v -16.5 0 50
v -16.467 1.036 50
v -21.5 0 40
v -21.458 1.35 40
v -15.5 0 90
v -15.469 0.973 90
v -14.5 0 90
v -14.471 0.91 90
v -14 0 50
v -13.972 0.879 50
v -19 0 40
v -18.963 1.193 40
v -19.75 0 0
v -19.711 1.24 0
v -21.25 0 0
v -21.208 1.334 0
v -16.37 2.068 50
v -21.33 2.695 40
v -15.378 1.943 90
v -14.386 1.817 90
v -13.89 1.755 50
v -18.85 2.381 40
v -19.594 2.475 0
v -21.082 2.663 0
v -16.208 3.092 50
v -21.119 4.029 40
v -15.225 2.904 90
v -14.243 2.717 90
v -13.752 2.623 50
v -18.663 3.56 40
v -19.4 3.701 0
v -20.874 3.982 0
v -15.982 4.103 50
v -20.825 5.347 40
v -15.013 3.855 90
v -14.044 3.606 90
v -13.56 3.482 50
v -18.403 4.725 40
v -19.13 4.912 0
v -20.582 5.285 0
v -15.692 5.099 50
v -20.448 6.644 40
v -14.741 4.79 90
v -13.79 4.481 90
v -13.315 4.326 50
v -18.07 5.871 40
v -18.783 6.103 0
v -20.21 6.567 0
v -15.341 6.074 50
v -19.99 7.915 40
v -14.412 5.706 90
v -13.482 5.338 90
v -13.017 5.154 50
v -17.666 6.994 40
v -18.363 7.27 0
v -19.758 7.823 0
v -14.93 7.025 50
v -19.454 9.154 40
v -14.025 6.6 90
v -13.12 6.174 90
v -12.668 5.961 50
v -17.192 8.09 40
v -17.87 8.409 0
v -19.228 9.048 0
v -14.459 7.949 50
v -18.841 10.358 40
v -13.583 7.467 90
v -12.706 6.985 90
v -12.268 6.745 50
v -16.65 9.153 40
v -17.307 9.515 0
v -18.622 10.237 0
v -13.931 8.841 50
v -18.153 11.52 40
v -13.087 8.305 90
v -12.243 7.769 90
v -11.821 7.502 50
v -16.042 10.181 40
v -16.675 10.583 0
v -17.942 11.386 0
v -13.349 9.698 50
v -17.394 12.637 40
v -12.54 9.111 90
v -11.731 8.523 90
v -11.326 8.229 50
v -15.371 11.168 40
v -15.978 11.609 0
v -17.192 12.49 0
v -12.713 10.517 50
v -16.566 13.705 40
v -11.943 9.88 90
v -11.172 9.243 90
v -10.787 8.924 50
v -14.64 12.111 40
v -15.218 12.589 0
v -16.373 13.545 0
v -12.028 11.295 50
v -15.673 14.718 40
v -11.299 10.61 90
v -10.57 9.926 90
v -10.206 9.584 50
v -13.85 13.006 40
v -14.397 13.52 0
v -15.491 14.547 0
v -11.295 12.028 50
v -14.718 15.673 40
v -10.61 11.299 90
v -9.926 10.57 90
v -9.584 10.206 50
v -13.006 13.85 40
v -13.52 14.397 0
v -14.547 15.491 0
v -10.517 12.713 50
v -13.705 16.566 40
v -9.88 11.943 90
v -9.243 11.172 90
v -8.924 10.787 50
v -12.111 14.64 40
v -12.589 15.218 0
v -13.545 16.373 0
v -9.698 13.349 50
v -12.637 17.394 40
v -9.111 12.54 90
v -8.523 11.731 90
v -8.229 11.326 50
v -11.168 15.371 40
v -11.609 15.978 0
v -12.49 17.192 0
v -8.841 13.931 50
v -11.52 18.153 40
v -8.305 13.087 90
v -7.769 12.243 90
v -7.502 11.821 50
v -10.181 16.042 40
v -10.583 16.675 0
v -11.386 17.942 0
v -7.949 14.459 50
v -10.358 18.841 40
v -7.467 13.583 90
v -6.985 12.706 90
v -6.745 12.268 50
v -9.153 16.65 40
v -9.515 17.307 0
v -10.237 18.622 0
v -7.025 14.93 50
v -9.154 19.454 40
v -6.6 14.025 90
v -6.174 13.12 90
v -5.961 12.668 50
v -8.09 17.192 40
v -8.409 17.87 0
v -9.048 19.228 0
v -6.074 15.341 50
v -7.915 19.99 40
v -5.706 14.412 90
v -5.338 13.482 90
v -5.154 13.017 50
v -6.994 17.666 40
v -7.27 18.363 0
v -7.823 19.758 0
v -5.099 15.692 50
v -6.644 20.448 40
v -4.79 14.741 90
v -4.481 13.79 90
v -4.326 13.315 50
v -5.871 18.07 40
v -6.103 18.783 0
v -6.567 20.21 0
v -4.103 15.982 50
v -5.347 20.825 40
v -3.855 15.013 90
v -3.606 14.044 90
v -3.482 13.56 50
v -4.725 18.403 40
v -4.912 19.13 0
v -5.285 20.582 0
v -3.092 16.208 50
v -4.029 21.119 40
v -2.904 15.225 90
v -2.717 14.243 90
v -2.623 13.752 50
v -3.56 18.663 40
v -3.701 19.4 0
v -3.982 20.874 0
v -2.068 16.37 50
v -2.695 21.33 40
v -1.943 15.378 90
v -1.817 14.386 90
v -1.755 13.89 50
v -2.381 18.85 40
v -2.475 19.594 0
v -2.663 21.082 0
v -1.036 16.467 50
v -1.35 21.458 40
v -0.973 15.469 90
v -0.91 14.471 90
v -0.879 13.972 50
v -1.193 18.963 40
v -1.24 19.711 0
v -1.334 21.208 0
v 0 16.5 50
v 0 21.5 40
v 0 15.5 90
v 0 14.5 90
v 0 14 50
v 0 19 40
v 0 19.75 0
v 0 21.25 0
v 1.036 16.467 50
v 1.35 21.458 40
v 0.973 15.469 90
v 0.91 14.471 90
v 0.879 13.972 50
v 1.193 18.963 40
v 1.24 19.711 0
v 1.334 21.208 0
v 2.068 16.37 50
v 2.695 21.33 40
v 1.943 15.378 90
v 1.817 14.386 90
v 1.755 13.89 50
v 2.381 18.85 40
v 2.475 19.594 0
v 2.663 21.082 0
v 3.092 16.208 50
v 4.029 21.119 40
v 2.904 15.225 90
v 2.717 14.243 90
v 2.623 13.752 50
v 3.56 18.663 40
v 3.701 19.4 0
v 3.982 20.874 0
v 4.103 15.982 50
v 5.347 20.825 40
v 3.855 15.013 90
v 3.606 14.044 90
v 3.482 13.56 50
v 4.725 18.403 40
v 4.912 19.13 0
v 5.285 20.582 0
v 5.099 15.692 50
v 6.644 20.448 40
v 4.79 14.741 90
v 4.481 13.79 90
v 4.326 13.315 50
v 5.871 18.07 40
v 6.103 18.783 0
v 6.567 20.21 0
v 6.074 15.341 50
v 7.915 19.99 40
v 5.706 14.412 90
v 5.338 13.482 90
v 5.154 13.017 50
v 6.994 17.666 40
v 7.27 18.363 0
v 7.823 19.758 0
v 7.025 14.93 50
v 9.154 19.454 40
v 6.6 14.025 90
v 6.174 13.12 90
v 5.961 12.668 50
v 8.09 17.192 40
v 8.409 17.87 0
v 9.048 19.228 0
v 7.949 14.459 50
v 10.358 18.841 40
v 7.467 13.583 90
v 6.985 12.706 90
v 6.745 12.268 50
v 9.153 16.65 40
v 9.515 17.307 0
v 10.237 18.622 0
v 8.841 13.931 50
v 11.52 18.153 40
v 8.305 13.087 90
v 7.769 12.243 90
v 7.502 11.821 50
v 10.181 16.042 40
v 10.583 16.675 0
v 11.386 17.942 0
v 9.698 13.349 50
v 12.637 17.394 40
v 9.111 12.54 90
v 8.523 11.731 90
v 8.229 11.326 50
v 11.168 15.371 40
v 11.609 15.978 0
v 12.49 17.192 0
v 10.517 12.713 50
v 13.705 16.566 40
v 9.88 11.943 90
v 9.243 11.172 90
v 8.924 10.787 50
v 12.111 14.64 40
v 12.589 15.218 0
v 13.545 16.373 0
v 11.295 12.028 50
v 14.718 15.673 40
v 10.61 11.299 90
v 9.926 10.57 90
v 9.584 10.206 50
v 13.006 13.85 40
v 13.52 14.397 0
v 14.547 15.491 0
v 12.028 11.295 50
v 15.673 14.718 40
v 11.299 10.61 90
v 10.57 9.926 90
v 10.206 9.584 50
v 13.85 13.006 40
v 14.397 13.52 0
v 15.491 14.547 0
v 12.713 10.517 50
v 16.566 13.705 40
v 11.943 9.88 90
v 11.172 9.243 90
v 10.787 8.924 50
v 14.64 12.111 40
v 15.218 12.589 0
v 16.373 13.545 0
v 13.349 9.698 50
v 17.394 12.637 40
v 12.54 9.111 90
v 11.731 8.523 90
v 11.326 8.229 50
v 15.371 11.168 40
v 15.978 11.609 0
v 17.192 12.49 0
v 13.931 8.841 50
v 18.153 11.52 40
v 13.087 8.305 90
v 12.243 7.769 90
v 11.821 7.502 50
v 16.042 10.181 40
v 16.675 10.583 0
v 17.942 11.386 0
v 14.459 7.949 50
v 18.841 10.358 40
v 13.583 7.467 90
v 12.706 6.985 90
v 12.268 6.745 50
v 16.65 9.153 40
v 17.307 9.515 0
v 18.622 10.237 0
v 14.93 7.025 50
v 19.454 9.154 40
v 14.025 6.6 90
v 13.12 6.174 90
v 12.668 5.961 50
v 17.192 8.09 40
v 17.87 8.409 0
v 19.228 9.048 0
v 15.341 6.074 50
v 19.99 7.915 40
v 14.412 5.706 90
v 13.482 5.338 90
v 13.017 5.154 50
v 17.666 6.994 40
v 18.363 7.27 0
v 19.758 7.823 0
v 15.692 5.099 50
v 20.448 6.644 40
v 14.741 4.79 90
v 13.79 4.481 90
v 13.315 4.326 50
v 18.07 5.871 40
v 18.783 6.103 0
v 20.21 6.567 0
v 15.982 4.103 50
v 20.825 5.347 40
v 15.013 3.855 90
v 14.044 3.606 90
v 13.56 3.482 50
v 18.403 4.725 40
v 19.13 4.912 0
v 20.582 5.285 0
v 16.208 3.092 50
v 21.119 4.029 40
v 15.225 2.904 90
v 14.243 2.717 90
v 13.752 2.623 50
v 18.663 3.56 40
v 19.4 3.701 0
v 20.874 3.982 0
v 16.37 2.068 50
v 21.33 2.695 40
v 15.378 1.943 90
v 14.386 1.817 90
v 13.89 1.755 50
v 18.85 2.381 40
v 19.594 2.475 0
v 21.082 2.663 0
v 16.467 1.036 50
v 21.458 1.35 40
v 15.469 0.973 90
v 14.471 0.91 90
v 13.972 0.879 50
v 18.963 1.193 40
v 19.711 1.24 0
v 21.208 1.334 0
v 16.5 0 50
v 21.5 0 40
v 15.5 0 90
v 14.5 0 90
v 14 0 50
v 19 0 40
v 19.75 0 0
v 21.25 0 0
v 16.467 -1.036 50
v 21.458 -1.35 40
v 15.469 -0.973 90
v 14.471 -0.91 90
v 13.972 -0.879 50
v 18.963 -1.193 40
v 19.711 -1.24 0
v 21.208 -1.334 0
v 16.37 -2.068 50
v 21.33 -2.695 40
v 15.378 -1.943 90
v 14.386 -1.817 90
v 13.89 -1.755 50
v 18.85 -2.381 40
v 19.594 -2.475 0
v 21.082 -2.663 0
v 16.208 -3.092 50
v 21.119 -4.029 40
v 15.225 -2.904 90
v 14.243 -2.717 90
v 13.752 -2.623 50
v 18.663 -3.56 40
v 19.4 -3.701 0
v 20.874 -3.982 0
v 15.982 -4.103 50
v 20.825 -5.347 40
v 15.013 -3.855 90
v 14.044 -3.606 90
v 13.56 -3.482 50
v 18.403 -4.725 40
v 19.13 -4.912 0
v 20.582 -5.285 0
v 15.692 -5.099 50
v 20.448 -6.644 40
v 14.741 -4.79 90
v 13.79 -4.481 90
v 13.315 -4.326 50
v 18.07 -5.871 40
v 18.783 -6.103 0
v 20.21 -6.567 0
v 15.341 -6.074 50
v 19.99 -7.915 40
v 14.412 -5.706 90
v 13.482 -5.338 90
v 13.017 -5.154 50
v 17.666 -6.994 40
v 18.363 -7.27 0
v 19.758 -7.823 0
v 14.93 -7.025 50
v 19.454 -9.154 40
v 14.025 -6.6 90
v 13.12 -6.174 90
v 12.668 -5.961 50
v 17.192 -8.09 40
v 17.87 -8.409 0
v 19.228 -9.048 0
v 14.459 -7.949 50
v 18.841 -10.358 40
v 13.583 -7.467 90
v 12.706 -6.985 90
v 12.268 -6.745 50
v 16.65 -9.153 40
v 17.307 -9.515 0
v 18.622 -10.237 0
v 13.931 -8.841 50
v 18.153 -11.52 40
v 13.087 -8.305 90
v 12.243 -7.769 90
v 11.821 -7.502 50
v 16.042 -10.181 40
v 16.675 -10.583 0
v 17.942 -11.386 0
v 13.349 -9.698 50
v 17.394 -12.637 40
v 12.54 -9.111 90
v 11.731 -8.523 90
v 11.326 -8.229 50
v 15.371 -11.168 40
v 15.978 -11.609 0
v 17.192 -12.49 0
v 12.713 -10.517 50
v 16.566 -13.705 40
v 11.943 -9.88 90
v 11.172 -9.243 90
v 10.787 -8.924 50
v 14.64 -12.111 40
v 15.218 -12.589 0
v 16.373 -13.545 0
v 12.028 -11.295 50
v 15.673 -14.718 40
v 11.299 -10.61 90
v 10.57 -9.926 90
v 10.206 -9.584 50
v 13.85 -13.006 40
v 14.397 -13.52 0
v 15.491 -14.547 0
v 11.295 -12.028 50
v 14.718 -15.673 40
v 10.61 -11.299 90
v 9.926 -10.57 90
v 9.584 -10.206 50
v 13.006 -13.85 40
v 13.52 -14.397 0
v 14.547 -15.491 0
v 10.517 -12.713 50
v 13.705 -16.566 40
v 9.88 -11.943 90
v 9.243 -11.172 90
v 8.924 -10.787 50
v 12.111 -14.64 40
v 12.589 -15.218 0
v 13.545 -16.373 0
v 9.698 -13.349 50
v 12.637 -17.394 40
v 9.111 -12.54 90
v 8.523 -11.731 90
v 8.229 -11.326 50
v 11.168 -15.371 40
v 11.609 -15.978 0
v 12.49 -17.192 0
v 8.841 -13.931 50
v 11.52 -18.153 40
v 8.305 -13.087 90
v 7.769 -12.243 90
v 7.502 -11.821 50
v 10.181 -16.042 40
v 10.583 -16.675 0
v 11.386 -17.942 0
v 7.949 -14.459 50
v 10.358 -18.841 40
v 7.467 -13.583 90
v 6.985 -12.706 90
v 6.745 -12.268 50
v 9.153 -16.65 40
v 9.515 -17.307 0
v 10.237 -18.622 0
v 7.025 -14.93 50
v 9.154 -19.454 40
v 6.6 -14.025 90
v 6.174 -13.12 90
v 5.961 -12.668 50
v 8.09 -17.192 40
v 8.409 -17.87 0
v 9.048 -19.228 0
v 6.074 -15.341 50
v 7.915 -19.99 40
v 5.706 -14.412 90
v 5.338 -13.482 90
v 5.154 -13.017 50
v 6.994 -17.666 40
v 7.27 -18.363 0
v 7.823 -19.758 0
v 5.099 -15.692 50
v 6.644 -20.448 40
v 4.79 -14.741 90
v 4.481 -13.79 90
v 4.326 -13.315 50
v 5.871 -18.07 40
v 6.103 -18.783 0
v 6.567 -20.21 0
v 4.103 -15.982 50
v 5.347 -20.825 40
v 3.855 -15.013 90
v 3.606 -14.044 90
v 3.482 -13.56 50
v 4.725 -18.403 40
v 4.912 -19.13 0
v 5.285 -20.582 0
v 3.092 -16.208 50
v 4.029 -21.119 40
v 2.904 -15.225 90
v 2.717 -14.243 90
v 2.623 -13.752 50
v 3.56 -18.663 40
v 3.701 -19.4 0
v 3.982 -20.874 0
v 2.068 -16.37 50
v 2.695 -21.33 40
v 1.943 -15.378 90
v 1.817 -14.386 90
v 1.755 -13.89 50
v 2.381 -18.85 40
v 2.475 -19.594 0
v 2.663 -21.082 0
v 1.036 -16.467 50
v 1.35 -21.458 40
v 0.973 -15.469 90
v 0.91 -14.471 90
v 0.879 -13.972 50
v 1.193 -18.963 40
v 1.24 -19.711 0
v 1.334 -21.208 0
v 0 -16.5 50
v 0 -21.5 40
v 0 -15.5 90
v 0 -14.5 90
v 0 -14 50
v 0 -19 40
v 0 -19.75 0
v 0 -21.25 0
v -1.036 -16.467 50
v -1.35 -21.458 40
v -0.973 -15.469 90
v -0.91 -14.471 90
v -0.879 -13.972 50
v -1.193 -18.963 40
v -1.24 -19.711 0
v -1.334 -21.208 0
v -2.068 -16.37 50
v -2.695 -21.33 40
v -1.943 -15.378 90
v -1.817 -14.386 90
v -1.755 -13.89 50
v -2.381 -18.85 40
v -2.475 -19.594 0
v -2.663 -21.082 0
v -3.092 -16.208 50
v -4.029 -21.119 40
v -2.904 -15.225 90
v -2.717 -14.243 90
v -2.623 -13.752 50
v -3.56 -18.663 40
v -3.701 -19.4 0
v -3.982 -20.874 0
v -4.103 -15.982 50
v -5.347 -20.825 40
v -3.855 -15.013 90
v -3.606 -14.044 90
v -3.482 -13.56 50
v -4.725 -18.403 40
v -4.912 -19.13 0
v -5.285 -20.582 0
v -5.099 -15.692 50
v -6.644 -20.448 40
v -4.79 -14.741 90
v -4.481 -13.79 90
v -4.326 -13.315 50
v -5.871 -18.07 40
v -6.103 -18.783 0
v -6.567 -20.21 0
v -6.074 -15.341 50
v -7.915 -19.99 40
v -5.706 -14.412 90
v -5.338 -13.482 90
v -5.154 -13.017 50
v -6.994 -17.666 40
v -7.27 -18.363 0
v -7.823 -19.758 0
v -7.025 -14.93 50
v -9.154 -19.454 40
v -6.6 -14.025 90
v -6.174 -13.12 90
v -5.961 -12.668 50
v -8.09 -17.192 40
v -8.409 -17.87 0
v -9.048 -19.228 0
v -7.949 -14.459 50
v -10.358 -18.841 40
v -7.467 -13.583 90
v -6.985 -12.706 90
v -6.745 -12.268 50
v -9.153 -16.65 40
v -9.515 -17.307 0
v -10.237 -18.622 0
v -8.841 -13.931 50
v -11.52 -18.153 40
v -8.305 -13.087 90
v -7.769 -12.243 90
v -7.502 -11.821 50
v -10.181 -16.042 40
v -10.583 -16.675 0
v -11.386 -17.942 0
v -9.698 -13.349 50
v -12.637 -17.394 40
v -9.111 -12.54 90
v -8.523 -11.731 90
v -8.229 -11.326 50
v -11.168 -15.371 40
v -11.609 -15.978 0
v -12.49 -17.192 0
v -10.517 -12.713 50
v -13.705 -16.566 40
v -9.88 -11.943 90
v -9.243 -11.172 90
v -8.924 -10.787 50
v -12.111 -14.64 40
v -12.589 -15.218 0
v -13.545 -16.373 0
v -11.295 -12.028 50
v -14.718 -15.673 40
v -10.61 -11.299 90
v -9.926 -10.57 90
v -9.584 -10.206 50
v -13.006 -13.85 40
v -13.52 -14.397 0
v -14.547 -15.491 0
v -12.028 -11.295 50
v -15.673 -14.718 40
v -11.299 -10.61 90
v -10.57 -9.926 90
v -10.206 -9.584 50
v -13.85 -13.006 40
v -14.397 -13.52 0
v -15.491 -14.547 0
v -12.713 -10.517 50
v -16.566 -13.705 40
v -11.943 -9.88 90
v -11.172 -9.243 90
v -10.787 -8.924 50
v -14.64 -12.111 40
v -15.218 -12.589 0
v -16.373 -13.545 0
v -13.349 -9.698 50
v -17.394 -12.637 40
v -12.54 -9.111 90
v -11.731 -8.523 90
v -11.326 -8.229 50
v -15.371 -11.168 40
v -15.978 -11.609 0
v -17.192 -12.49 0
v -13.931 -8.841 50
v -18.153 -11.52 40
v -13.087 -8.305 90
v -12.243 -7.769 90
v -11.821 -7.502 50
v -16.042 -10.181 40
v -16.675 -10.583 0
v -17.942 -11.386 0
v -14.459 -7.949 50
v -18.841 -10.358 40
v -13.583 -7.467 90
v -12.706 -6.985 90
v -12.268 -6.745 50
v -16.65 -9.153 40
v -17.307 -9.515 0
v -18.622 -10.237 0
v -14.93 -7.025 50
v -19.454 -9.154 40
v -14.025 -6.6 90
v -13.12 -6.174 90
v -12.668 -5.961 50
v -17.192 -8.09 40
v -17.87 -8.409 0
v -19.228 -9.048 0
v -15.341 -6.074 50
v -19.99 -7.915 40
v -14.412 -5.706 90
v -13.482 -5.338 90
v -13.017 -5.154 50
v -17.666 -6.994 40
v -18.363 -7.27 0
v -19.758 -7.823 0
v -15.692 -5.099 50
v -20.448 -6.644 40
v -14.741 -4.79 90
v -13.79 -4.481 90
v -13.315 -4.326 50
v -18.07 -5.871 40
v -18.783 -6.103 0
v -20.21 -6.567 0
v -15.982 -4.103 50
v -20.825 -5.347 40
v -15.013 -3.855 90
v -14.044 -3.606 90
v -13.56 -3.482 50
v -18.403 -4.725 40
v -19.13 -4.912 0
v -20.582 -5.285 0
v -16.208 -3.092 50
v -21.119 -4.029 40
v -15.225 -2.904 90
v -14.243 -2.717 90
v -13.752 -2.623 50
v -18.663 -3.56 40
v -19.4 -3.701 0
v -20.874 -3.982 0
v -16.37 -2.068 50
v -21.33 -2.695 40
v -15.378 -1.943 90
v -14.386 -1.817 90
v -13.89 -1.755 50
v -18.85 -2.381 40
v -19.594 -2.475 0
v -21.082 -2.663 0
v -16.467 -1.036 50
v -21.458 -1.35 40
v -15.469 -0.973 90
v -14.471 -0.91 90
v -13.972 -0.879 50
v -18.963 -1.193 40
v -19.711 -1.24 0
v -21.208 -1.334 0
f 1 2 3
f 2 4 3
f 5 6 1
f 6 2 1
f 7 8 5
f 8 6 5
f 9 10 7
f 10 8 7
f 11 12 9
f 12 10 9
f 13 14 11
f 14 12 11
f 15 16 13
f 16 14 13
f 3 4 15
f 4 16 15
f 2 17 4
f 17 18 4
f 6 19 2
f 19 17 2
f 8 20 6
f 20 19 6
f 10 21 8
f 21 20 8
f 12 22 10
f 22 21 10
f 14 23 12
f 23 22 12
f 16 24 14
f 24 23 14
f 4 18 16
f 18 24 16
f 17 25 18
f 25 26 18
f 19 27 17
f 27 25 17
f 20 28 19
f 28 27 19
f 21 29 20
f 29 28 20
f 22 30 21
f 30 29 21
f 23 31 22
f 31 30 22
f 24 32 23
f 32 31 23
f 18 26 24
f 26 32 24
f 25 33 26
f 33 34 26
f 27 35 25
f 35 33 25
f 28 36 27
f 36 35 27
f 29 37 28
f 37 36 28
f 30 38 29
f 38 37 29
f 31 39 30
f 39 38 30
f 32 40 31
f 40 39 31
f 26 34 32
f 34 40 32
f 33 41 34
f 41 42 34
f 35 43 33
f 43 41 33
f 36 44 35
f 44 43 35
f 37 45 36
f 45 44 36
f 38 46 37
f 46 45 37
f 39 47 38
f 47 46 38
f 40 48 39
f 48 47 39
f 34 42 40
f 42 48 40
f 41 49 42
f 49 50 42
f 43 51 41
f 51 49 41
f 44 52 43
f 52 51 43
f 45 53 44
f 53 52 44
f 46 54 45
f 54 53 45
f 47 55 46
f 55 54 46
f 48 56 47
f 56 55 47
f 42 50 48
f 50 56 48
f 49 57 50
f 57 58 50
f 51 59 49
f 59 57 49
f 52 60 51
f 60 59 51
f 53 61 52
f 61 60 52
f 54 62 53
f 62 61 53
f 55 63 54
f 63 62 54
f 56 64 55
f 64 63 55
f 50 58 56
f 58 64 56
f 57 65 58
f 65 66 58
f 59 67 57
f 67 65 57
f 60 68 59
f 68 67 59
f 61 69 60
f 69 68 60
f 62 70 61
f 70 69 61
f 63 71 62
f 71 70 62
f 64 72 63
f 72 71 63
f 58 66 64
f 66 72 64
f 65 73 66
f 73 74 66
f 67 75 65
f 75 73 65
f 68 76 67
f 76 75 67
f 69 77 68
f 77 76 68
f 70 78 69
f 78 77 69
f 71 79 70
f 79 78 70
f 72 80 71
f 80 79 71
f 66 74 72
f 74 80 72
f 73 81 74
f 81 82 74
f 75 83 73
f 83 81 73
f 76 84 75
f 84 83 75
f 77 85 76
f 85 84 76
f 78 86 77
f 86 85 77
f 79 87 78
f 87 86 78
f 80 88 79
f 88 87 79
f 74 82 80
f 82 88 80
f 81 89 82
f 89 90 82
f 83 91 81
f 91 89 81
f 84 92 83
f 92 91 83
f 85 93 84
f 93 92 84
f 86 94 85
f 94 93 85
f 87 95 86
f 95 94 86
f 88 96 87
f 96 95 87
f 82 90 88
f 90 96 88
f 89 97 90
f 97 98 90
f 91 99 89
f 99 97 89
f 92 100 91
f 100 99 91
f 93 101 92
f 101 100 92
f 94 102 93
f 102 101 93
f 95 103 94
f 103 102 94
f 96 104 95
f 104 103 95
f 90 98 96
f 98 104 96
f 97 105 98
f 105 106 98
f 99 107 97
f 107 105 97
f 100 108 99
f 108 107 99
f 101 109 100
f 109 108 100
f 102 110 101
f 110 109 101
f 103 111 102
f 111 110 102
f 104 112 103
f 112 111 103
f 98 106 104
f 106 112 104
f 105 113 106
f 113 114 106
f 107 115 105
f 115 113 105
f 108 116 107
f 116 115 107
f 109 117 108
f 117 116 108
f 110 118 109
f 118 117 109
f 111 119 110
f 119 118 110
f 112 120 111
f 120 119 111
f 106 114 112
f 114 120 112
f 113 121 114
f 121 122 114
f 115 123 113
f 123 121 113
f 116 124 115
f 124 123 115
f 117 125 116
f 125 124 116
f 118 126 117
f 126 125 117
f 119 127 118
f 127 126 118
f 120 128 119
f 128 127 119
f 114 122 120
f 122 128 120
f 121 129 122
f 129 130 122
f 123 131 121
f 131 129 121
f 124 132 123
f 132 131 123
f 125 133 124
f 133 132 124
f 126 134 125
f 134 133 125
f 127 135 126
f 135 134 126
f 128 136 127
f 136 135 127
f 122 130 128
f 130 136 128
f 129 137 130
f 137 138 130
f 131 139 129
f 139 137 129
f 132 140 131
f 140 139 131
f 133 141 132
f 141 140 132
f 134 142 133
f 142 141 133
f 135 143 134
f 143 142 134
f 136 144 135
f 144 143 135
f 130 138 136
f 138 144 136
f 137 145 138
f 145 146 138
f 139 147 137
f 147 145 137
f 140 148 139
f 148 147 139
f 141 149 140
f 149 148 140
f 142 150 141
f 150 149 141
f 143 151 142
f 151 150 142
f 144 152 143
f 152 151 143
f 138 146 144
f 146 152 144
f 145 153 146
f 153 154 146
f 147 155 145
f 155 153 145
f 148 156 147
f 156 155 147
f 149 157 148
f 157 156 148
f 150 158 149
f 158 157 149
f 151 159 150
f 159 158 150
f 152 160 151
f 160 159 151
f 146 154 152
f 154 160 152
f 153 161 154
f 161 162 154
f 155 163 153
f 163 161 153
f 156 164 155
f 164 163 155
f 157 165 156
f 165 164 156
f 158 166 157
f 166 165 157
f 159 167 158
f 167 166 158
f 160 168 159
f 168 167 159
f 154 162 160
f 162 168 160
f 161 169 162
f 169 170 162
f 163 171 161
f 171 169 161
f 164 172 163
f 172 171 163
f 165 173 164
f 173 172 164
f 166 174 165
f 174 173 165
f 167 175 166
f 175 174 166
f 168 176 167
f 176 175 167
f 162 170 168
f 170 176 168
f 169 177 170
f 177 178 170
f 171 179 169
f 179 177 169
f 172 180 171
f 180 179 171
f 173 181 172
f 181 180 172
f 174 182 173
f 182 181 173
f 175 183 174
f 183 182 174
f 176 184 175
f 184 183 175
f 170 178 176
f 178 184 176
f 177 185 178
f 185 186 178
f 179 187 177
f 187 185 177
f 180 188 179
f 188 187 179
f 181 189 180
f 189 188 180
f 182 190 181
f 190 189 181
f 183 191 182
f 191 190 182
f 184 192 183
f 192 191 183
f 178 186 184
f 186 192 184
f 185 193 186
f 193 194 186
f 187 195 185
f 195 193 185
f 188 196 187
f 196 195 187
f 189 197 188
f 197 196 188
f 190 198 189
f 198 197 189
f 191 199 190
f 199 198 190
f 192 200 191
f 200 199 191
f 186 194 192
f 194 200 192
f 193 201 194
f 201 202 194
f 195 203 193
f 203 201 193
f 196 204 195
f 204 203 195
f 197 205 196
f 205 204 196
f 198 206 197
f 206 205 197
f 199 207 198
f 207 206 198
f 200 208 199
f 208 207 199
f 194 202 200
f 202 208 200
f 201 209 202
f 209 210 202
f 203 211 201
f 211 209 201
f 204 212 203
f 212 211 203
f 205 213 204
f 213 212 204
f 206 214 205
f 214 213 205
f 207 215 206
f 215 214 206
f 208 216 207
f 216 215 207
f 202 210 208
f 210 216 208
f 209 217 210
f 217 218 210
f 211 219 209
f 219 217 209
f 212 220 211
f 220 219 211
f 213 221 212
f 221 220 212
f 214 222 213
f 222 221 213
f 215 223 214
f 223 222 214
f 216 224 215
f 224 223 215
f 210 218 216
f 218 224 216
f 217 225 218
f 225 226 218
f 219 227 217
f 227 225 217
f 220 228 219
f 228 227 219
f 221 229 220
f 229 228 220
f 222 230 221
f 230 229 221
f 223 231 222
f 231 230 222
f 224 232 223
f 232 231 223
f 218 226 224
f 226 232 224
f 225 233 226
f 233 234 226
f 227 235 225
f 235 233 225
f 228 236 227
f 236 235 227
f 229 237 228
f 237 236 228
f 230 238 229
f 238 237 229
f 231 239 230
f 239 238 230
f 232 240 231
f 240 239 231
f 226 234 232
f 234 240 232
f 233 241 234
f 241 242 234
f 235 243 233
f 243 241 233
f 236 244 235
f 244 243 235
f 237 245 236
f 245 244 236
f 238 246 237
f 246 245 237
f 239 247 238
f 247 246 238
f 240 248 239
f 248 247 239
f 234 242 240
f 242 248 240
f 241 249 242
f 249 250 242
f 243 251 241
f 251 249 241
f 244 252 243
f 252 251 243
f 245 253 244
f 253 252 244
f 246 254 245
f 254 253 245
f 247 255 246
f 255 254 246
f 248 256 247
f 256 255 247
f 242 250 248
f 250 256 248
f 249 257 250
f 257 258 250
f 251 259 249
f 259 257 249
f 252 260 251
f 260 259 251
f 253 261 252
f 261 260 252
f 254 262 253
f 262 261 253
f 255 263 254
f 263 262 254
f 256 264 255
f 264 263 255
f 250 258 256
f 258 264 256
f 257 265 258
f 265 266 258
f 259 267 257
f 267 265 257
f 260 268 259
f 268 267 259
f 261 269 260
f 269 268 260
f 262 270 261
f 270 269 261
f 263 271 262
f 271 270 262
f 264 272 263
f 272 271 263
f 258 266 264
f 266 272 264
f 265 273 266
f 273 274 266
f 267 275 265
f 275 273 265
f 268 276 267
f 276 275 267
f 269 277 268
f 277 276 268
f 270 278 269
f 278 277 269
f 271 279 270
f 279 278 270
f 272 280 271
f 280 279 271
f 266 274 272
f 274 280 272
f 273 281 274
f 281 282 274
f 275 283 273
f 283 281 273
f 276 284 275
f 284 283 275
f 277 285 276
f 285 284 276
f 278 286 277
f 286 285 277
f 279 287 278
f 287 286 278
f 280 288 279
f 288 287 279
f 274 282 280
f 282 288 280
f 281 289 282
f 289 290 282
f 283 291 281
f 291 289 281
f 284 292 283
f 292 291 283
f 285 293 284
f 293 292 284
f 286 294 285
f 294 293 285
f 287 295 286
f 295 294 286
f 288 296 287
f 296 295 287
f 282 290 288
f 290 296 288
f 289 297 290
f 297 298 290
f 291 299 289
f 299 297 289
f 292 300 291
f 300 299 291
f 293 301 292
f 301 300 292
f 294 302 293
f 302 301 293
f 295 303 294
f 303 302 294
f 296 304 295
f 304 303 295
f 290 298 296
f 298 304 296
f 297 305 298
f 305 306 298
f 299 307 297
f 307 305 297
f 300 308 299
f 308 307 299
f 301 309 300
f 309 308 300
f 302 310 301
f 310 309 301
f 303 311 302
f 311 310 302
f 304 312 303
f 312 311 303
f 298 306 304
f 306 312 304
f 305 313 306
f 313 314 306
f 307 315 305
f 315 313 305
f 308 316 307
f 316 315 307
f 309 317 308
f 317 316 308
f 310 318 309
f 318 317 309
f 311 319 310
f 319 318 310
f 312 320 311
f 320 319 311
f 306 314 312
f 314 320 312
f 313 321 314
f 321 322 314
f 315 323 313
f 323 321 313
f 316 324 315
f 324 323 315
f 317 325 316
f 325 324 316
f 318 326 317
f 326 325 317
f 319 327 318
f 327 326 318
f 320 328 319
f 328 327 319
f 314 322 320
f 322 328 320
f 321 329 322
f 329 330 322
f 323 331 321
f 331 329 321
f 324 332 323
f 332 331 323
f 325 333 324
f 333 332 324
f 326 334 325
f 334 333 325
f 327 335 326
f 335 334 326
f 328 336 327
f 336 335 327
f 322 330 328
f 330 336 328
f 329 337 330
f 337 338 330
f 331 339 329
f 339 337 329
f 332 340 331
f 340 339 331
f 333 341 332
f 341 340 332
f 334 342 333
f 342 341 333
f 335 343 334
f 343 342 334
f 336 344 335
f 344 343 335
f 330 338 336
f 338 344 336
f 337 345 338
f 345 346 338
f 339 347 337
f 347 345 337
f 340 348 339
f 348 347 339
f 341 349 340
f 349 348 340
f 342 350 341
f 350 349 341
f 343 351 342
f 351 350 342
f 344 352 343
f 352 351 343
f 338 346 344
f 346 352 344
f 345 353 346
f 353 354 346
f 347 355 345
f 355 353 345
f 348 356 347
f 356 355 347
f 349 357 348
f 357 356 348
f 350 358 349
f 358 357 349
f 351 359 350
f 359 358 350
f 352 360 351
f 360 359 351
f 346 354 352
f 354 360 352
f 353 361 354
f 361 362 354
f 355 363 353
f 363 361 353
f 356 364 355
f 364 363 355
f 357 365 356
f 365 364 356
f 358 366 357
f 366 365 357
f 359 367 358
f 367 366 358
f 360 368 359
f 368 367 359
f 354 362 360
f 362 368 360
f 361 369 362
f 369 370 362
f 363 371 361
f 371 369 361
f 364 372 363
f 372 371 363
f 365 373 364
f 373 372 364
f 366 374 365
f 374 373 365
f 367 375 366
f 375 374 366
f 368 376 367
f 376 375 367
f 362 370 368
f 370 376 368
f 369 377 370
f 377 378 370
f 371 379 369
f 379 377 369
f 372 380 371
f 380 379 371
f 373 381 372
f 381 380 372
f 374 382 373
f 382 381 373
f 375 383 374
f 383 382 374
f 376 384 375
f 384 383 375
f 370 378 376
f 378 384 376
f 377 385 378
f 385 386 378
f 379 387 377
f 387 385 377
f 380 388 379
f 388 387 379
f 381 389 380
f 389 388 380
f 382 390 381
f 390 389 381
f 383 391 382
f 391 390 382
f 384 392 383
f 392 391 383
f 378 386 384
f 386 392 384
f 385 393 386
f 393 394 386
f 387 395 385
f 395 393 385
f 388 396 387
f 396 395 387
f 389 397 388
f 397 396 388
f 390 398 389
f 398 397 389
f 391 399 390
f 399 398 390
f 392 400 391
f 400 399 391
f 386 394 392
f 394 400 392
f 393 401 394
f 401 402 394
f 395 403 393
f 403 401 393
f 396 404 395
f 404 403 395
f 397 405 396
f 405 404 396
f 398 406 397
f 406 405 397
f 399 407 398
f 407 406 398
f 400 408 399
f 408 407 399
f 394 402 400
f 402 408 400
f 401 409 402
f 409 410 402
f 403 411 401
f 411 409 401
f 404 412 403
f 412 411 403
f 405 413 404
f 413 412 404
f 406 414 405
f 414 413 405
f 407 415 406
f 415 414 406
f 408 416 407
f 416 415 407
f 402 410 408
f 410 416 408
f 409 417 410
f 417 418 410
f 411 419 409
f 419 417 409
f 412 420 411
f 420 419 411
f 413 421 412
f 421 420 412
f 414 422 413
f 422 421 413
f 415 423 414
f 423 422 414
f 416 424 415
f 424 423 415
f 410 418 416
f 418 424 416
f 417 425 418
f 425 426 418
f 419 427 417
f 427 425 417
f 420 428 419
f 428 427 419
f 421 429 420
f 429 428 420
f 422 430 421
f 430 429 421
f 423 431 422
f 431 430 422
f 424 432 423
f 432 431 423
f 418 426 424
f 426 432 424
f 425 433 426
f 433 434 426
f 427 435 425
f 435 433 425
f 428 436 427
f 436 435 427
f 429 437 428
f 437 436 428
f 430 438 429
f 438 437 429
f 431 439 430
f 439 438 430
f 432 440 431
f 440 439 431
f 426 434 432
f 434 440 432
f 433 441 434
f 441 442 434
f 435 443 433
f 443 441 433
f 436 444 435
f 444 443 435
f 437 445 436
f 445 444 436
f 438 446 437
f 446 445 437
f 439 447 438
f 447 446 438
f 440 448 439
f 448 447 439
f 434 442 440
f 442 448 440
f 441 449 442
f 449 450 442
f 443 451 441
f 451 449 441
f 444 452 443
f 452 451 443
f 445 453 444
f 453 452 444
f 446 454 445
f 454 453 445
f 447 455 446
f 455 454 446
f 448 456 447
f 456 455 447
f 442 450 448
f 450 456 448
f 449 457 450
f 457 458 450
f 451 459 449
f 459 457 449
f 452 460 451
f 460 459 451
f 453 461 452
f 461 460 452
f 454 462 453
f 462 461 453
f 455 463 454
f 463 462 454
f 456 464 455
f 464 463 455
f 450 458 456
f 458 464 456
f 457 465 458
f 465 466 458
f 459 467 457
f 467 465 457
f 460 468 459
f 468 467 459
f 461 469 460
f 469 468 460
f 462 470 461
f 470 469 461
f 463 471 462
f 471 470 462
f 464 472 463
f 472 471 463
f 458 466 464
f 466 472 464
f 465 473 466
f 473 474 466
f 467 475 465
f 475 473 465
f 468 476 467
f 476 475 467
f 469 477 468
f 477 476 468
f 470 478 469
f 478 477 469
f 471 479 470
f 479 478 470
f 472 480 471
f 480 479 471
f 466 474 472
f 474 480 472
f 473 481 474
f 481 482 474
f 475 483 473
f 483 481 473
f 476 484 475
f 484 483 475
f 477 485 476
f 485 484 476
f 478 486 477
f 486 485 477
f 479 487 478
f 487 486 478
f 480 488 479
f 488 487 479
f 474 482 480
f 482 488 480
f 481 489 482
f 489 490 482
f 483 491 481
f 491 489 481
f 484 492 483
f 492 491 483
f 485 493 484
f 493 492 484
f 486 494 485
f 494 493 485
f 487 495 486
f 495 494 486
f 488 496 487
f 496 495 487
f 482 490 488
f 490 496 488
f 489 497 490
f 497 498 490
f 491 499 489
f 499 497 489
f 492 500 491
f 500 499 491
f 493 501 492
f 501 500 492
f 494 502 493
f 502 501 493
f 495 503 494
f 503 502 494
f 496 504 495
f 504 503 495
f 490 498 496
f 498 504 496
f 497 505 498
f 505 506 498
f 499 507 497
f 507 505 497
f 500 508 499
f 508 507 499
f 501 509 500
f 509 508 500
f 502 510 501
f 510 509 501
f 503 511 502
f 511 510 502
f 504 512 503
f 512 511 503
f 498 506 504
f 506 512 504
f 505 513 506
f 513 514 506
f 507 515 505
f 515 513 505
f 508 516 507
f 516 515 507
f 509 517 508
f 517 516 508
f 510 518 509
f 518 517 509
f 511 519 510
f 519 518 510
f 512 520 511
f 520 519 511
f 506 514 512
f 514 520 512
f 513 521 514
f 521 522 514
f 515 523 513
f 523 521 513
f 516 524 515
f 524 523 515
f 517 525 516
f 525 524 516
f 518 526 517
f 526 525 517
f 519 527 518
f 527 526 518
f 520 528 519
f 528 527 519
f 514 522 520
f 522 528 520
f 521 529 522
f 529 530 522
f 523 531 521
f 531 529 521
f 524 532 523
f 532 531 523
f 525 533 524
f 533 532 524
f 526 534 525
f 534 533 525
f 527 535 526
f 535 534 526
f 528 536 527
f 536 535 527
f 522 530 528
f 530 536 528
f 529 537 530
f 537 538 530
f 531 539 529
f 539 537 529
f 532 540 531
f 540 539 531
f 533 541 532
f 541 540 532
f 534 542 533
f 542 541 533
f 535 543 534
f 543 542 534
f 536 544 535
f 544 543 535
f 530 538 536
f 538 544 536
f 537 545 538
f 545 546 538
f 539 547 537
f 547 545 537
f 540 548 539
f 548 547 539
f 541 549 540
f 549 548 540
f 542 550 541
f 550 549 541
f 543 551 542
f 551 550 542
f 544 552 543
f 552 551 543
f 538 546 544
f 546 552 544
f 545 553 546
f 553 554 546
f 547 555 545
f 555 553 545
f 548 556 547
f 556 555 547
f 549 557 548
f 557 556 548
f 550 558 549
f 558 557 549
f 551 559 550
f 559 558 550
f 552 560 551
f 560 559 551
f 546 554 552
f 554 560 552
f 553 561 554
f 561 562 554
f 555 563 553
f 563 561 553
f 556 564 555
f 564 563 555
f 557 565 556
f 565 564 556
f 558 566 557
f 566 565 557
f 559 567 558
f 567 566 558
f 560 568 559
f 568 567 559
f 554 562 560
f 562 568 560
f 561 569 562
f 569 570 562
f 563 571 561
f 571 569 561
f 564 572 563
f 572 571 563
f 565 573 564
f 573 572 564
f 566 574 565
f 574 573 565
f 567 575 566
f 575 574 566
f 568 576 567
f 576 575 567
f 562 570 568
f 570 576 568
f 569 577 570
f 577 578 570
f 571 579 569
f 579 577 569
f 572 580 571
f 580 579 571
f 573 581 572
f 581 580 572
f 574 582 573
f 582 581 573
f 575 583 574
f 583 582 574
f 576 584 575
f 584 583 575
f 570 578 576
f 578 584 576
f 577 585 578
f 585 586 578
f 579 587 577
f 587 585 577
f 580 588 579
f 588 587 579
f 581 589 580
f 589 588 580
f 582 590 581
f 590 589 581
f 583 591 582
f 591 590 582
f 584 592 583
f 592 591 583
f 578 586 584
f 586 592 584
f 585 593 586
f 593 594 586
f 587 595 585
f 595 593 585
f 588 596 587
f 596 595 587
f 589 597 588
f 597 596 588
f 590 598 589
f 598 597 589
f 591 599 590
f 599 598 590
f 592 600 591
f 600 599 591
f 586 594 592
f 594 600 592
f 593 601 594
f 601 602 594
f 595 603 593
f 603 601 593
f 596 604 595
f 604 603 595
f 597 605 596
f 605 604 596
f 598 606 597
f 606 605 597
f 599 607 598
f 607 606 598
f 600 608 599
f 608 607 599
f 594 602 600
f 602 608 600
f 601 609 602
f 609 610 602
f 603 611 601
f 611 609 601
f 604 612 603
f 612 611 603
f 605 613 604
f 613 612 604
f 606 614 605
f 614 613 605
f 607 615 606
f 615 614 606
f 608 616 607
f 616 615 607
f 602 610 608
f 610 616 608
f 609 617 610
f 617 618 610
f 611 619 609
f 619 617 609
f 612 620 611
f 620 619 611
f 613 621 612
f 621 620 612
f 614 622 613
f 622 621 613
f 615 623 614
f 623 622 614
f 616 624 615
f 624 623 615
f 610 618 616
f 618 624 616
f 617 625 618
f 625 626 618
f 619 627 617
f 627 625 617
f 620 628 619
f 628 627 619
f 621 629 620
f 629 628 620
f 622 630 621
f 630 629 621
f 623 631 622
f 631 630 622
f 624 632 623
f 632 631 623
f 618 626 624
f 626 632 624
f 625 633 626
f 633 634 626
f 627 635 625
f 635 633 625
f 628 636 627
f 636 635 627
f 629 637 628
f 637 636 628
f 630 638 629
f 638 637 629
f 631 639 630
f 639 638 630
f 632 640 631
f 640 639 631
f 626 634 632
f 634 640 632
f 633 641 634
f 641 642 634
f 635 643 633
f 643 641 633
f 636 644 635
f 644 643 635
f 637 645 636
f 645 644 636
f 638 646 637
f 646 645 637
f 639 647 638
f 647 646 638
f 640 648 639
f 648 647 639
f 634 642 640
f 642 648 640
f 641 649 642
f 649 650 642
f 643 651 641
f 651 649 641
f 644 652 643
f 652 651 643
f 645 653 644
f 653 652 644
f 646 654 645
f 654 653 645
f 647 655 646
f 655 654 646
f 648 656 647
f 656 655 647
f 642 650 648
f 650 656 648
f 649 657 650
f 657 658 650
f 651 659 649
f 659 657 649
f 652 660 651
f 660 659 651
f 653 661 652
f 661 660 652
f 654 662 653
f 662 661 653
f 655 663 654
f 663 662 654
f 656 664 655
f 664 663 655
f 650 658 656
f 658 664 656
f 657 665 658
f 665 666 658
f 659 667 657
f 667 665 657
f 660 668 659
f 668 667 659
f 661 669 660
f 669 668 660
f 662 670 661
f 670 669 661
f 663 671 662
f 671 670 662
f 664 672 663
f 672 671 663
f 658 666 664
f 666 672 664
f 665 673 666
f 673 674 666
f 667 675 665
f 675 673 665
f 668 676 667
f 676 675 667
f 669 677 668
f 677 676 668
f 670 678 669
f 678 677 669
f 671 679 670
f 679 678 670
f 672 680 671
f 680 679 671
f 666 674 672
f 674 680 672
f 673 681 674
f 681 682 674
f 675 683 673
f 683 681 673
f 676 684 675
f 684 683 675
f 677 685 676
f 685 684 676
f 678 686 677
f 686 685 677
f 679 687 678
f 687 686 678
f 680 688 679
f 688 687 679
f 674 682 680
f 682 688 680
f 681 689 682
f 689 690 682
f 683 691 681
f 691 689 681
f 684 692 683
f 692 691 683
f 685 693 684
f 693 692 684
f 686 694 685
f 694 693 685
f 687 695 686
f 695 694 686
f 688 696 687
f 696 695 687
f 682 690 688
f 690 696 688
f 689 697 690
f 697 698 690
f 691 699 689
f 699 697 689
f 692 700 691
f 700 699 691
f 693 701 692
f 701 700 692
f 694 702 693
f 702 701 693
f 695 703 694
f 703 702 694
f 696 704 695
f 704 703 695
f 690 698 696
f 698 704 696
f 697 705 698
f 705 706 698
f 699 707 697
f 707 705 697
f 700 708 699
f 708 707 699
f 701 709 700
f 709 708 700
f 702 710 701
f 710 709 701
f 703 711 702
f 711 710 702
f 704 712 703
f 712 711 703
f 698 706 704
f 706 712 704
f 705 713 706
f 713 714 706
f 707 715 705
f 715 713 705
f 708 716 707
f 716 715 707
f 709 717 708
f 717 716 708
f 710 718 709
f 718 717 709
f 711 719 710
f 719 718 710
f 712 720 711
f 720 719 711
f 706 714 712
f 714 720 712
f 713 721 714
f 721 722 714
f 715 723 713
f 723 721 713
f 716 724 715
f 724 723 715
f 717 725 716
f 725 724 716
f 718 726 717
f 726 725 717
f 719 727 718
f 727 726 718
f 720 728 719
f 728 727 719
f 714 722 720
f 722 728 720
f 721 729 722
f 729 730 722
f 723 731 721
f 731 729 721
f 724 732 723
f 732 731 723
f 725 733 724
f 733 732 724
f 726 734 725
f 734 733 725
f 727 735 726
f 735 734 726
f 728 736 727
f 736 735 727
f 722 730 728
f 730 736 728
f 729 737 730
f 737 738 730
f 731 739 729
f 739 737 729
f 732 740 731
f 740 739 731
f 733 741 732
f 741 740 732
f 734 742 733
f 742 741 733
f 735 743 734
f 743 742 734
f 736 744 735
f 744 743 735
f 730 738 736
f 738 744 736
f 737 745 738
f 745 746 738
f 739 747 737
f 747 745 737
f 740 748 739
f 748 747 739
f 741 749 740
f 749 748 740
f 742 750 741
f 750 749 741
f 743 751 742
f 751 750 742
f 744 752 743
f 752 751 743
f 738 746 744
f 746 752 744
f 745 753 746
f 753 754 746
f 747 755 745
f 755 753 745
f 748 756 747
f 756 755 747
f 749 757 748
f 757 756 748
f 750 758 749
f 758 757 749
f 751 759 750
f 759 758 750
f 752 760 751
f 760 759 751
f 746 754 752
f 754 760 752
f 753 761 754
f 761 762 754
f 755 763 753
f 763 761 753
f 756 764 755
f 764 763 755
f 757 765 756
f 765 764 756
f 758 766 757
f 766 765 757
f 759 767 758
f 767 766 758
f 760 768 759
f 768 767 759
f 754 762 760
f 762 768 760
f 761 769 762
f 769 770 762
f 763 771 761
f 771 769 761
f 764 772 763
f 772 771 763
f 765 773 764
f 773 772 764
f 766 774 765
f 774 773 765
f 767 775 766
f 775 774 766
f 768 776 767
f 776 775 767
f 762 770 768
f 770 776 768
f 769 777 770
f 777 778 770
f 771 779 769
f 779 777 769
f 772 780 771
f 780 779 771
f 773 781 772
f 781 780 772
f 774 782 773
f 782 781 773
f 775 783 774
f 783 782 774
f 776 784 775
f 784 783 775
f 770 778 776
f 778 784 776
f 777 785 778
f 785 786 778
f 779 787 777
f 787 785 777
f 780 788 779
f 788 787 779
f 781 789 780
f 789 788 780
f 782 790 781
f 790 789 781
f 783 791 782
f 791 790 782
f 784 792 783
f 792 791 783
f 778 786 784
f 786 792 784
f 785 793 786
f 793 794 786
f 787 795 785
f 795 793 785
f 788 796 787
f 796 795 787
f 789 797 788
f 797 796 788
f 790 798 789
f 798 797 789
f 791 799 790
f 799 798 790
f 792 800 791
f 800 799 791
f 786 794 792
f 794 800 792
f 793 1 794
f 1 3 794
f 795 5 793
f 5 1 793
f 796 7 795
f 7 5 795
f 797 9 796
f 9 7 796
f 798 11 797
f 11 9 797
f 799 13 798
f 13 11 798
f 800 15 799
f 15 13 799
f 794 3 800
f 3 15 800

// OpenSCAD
// Bottom segment bottom inner diameter
bbi = 39.5; // [1:0.5:100]

// Bottom segment bottom outer diameter
bbo = 42.5; // [1:0.5:100]

// Bottom segment top inner diameter
bti = 38; // [1:0.5:100]

// Bottom segment top outer diameter
bto = 43; // [1:0.5:100]

// Bottom segment height
bh = 40; // [1:0.5:100]

// Junction height
jh = 10; // [1:0.5:100]

// Top segment bottom inner diameter
tbi = 28; // [1:0.5:100]

// Top segment bottom outer diameter
tbo = 33; // [1:0.5:100]

// Top segment top inner diameter
tti = 29; // [1:0.5:100]

// Top segment top outer diameter
tto = 31; // [1:0.5:100]

// Top segment height
th = 40; // [1:0.5:100]

//descr = [
//    [39.5, 42.5, 0], // internal
//    [38, 43, 40], // internal
//    [28, 33, 10], // external
//    [29, 31, 40], // external
//];

descr = [
    [bbi, bbo, 0],
    [bti, bto, bh],
    [tbi, tbo, jh],
    [tti, tto, th]
];

$fn = 100;

//use <pipe.scad>
//-------------------------------------------------------------------------------
// descr is a vector of vectors [inner_d, outer_d, height]
module pipe(descr, $fn=$fn) {
    function combine_descr(descr, i) =
        i == 0
            ? [[[descr[0][0], descr[0][2]]], [[descr[0][1], descr[0][2]]]]
            : let(p=combine_descr(descr, i-1), h=p[0][i-1][1]+descr[i][2])
                [concat(p[0], [[descr[i][0], h]]), concat(p[1], [[descr[i][1], h]])];
                
    function create_shape(descr) =
        let(c=combine_descr(descr, len(descr) - 1))
            concat(c[0], [for (i = [len(c[1])-1:-1:0]) c[1][i]]);
                
    rotate_extrude($fn=$fn)
        scale([0.5, 1]) // diameter -> radius
            polygon(create_shape(descr));
}
//-------------------------------------------------------------------------------

// print_part
pipe(descr);
